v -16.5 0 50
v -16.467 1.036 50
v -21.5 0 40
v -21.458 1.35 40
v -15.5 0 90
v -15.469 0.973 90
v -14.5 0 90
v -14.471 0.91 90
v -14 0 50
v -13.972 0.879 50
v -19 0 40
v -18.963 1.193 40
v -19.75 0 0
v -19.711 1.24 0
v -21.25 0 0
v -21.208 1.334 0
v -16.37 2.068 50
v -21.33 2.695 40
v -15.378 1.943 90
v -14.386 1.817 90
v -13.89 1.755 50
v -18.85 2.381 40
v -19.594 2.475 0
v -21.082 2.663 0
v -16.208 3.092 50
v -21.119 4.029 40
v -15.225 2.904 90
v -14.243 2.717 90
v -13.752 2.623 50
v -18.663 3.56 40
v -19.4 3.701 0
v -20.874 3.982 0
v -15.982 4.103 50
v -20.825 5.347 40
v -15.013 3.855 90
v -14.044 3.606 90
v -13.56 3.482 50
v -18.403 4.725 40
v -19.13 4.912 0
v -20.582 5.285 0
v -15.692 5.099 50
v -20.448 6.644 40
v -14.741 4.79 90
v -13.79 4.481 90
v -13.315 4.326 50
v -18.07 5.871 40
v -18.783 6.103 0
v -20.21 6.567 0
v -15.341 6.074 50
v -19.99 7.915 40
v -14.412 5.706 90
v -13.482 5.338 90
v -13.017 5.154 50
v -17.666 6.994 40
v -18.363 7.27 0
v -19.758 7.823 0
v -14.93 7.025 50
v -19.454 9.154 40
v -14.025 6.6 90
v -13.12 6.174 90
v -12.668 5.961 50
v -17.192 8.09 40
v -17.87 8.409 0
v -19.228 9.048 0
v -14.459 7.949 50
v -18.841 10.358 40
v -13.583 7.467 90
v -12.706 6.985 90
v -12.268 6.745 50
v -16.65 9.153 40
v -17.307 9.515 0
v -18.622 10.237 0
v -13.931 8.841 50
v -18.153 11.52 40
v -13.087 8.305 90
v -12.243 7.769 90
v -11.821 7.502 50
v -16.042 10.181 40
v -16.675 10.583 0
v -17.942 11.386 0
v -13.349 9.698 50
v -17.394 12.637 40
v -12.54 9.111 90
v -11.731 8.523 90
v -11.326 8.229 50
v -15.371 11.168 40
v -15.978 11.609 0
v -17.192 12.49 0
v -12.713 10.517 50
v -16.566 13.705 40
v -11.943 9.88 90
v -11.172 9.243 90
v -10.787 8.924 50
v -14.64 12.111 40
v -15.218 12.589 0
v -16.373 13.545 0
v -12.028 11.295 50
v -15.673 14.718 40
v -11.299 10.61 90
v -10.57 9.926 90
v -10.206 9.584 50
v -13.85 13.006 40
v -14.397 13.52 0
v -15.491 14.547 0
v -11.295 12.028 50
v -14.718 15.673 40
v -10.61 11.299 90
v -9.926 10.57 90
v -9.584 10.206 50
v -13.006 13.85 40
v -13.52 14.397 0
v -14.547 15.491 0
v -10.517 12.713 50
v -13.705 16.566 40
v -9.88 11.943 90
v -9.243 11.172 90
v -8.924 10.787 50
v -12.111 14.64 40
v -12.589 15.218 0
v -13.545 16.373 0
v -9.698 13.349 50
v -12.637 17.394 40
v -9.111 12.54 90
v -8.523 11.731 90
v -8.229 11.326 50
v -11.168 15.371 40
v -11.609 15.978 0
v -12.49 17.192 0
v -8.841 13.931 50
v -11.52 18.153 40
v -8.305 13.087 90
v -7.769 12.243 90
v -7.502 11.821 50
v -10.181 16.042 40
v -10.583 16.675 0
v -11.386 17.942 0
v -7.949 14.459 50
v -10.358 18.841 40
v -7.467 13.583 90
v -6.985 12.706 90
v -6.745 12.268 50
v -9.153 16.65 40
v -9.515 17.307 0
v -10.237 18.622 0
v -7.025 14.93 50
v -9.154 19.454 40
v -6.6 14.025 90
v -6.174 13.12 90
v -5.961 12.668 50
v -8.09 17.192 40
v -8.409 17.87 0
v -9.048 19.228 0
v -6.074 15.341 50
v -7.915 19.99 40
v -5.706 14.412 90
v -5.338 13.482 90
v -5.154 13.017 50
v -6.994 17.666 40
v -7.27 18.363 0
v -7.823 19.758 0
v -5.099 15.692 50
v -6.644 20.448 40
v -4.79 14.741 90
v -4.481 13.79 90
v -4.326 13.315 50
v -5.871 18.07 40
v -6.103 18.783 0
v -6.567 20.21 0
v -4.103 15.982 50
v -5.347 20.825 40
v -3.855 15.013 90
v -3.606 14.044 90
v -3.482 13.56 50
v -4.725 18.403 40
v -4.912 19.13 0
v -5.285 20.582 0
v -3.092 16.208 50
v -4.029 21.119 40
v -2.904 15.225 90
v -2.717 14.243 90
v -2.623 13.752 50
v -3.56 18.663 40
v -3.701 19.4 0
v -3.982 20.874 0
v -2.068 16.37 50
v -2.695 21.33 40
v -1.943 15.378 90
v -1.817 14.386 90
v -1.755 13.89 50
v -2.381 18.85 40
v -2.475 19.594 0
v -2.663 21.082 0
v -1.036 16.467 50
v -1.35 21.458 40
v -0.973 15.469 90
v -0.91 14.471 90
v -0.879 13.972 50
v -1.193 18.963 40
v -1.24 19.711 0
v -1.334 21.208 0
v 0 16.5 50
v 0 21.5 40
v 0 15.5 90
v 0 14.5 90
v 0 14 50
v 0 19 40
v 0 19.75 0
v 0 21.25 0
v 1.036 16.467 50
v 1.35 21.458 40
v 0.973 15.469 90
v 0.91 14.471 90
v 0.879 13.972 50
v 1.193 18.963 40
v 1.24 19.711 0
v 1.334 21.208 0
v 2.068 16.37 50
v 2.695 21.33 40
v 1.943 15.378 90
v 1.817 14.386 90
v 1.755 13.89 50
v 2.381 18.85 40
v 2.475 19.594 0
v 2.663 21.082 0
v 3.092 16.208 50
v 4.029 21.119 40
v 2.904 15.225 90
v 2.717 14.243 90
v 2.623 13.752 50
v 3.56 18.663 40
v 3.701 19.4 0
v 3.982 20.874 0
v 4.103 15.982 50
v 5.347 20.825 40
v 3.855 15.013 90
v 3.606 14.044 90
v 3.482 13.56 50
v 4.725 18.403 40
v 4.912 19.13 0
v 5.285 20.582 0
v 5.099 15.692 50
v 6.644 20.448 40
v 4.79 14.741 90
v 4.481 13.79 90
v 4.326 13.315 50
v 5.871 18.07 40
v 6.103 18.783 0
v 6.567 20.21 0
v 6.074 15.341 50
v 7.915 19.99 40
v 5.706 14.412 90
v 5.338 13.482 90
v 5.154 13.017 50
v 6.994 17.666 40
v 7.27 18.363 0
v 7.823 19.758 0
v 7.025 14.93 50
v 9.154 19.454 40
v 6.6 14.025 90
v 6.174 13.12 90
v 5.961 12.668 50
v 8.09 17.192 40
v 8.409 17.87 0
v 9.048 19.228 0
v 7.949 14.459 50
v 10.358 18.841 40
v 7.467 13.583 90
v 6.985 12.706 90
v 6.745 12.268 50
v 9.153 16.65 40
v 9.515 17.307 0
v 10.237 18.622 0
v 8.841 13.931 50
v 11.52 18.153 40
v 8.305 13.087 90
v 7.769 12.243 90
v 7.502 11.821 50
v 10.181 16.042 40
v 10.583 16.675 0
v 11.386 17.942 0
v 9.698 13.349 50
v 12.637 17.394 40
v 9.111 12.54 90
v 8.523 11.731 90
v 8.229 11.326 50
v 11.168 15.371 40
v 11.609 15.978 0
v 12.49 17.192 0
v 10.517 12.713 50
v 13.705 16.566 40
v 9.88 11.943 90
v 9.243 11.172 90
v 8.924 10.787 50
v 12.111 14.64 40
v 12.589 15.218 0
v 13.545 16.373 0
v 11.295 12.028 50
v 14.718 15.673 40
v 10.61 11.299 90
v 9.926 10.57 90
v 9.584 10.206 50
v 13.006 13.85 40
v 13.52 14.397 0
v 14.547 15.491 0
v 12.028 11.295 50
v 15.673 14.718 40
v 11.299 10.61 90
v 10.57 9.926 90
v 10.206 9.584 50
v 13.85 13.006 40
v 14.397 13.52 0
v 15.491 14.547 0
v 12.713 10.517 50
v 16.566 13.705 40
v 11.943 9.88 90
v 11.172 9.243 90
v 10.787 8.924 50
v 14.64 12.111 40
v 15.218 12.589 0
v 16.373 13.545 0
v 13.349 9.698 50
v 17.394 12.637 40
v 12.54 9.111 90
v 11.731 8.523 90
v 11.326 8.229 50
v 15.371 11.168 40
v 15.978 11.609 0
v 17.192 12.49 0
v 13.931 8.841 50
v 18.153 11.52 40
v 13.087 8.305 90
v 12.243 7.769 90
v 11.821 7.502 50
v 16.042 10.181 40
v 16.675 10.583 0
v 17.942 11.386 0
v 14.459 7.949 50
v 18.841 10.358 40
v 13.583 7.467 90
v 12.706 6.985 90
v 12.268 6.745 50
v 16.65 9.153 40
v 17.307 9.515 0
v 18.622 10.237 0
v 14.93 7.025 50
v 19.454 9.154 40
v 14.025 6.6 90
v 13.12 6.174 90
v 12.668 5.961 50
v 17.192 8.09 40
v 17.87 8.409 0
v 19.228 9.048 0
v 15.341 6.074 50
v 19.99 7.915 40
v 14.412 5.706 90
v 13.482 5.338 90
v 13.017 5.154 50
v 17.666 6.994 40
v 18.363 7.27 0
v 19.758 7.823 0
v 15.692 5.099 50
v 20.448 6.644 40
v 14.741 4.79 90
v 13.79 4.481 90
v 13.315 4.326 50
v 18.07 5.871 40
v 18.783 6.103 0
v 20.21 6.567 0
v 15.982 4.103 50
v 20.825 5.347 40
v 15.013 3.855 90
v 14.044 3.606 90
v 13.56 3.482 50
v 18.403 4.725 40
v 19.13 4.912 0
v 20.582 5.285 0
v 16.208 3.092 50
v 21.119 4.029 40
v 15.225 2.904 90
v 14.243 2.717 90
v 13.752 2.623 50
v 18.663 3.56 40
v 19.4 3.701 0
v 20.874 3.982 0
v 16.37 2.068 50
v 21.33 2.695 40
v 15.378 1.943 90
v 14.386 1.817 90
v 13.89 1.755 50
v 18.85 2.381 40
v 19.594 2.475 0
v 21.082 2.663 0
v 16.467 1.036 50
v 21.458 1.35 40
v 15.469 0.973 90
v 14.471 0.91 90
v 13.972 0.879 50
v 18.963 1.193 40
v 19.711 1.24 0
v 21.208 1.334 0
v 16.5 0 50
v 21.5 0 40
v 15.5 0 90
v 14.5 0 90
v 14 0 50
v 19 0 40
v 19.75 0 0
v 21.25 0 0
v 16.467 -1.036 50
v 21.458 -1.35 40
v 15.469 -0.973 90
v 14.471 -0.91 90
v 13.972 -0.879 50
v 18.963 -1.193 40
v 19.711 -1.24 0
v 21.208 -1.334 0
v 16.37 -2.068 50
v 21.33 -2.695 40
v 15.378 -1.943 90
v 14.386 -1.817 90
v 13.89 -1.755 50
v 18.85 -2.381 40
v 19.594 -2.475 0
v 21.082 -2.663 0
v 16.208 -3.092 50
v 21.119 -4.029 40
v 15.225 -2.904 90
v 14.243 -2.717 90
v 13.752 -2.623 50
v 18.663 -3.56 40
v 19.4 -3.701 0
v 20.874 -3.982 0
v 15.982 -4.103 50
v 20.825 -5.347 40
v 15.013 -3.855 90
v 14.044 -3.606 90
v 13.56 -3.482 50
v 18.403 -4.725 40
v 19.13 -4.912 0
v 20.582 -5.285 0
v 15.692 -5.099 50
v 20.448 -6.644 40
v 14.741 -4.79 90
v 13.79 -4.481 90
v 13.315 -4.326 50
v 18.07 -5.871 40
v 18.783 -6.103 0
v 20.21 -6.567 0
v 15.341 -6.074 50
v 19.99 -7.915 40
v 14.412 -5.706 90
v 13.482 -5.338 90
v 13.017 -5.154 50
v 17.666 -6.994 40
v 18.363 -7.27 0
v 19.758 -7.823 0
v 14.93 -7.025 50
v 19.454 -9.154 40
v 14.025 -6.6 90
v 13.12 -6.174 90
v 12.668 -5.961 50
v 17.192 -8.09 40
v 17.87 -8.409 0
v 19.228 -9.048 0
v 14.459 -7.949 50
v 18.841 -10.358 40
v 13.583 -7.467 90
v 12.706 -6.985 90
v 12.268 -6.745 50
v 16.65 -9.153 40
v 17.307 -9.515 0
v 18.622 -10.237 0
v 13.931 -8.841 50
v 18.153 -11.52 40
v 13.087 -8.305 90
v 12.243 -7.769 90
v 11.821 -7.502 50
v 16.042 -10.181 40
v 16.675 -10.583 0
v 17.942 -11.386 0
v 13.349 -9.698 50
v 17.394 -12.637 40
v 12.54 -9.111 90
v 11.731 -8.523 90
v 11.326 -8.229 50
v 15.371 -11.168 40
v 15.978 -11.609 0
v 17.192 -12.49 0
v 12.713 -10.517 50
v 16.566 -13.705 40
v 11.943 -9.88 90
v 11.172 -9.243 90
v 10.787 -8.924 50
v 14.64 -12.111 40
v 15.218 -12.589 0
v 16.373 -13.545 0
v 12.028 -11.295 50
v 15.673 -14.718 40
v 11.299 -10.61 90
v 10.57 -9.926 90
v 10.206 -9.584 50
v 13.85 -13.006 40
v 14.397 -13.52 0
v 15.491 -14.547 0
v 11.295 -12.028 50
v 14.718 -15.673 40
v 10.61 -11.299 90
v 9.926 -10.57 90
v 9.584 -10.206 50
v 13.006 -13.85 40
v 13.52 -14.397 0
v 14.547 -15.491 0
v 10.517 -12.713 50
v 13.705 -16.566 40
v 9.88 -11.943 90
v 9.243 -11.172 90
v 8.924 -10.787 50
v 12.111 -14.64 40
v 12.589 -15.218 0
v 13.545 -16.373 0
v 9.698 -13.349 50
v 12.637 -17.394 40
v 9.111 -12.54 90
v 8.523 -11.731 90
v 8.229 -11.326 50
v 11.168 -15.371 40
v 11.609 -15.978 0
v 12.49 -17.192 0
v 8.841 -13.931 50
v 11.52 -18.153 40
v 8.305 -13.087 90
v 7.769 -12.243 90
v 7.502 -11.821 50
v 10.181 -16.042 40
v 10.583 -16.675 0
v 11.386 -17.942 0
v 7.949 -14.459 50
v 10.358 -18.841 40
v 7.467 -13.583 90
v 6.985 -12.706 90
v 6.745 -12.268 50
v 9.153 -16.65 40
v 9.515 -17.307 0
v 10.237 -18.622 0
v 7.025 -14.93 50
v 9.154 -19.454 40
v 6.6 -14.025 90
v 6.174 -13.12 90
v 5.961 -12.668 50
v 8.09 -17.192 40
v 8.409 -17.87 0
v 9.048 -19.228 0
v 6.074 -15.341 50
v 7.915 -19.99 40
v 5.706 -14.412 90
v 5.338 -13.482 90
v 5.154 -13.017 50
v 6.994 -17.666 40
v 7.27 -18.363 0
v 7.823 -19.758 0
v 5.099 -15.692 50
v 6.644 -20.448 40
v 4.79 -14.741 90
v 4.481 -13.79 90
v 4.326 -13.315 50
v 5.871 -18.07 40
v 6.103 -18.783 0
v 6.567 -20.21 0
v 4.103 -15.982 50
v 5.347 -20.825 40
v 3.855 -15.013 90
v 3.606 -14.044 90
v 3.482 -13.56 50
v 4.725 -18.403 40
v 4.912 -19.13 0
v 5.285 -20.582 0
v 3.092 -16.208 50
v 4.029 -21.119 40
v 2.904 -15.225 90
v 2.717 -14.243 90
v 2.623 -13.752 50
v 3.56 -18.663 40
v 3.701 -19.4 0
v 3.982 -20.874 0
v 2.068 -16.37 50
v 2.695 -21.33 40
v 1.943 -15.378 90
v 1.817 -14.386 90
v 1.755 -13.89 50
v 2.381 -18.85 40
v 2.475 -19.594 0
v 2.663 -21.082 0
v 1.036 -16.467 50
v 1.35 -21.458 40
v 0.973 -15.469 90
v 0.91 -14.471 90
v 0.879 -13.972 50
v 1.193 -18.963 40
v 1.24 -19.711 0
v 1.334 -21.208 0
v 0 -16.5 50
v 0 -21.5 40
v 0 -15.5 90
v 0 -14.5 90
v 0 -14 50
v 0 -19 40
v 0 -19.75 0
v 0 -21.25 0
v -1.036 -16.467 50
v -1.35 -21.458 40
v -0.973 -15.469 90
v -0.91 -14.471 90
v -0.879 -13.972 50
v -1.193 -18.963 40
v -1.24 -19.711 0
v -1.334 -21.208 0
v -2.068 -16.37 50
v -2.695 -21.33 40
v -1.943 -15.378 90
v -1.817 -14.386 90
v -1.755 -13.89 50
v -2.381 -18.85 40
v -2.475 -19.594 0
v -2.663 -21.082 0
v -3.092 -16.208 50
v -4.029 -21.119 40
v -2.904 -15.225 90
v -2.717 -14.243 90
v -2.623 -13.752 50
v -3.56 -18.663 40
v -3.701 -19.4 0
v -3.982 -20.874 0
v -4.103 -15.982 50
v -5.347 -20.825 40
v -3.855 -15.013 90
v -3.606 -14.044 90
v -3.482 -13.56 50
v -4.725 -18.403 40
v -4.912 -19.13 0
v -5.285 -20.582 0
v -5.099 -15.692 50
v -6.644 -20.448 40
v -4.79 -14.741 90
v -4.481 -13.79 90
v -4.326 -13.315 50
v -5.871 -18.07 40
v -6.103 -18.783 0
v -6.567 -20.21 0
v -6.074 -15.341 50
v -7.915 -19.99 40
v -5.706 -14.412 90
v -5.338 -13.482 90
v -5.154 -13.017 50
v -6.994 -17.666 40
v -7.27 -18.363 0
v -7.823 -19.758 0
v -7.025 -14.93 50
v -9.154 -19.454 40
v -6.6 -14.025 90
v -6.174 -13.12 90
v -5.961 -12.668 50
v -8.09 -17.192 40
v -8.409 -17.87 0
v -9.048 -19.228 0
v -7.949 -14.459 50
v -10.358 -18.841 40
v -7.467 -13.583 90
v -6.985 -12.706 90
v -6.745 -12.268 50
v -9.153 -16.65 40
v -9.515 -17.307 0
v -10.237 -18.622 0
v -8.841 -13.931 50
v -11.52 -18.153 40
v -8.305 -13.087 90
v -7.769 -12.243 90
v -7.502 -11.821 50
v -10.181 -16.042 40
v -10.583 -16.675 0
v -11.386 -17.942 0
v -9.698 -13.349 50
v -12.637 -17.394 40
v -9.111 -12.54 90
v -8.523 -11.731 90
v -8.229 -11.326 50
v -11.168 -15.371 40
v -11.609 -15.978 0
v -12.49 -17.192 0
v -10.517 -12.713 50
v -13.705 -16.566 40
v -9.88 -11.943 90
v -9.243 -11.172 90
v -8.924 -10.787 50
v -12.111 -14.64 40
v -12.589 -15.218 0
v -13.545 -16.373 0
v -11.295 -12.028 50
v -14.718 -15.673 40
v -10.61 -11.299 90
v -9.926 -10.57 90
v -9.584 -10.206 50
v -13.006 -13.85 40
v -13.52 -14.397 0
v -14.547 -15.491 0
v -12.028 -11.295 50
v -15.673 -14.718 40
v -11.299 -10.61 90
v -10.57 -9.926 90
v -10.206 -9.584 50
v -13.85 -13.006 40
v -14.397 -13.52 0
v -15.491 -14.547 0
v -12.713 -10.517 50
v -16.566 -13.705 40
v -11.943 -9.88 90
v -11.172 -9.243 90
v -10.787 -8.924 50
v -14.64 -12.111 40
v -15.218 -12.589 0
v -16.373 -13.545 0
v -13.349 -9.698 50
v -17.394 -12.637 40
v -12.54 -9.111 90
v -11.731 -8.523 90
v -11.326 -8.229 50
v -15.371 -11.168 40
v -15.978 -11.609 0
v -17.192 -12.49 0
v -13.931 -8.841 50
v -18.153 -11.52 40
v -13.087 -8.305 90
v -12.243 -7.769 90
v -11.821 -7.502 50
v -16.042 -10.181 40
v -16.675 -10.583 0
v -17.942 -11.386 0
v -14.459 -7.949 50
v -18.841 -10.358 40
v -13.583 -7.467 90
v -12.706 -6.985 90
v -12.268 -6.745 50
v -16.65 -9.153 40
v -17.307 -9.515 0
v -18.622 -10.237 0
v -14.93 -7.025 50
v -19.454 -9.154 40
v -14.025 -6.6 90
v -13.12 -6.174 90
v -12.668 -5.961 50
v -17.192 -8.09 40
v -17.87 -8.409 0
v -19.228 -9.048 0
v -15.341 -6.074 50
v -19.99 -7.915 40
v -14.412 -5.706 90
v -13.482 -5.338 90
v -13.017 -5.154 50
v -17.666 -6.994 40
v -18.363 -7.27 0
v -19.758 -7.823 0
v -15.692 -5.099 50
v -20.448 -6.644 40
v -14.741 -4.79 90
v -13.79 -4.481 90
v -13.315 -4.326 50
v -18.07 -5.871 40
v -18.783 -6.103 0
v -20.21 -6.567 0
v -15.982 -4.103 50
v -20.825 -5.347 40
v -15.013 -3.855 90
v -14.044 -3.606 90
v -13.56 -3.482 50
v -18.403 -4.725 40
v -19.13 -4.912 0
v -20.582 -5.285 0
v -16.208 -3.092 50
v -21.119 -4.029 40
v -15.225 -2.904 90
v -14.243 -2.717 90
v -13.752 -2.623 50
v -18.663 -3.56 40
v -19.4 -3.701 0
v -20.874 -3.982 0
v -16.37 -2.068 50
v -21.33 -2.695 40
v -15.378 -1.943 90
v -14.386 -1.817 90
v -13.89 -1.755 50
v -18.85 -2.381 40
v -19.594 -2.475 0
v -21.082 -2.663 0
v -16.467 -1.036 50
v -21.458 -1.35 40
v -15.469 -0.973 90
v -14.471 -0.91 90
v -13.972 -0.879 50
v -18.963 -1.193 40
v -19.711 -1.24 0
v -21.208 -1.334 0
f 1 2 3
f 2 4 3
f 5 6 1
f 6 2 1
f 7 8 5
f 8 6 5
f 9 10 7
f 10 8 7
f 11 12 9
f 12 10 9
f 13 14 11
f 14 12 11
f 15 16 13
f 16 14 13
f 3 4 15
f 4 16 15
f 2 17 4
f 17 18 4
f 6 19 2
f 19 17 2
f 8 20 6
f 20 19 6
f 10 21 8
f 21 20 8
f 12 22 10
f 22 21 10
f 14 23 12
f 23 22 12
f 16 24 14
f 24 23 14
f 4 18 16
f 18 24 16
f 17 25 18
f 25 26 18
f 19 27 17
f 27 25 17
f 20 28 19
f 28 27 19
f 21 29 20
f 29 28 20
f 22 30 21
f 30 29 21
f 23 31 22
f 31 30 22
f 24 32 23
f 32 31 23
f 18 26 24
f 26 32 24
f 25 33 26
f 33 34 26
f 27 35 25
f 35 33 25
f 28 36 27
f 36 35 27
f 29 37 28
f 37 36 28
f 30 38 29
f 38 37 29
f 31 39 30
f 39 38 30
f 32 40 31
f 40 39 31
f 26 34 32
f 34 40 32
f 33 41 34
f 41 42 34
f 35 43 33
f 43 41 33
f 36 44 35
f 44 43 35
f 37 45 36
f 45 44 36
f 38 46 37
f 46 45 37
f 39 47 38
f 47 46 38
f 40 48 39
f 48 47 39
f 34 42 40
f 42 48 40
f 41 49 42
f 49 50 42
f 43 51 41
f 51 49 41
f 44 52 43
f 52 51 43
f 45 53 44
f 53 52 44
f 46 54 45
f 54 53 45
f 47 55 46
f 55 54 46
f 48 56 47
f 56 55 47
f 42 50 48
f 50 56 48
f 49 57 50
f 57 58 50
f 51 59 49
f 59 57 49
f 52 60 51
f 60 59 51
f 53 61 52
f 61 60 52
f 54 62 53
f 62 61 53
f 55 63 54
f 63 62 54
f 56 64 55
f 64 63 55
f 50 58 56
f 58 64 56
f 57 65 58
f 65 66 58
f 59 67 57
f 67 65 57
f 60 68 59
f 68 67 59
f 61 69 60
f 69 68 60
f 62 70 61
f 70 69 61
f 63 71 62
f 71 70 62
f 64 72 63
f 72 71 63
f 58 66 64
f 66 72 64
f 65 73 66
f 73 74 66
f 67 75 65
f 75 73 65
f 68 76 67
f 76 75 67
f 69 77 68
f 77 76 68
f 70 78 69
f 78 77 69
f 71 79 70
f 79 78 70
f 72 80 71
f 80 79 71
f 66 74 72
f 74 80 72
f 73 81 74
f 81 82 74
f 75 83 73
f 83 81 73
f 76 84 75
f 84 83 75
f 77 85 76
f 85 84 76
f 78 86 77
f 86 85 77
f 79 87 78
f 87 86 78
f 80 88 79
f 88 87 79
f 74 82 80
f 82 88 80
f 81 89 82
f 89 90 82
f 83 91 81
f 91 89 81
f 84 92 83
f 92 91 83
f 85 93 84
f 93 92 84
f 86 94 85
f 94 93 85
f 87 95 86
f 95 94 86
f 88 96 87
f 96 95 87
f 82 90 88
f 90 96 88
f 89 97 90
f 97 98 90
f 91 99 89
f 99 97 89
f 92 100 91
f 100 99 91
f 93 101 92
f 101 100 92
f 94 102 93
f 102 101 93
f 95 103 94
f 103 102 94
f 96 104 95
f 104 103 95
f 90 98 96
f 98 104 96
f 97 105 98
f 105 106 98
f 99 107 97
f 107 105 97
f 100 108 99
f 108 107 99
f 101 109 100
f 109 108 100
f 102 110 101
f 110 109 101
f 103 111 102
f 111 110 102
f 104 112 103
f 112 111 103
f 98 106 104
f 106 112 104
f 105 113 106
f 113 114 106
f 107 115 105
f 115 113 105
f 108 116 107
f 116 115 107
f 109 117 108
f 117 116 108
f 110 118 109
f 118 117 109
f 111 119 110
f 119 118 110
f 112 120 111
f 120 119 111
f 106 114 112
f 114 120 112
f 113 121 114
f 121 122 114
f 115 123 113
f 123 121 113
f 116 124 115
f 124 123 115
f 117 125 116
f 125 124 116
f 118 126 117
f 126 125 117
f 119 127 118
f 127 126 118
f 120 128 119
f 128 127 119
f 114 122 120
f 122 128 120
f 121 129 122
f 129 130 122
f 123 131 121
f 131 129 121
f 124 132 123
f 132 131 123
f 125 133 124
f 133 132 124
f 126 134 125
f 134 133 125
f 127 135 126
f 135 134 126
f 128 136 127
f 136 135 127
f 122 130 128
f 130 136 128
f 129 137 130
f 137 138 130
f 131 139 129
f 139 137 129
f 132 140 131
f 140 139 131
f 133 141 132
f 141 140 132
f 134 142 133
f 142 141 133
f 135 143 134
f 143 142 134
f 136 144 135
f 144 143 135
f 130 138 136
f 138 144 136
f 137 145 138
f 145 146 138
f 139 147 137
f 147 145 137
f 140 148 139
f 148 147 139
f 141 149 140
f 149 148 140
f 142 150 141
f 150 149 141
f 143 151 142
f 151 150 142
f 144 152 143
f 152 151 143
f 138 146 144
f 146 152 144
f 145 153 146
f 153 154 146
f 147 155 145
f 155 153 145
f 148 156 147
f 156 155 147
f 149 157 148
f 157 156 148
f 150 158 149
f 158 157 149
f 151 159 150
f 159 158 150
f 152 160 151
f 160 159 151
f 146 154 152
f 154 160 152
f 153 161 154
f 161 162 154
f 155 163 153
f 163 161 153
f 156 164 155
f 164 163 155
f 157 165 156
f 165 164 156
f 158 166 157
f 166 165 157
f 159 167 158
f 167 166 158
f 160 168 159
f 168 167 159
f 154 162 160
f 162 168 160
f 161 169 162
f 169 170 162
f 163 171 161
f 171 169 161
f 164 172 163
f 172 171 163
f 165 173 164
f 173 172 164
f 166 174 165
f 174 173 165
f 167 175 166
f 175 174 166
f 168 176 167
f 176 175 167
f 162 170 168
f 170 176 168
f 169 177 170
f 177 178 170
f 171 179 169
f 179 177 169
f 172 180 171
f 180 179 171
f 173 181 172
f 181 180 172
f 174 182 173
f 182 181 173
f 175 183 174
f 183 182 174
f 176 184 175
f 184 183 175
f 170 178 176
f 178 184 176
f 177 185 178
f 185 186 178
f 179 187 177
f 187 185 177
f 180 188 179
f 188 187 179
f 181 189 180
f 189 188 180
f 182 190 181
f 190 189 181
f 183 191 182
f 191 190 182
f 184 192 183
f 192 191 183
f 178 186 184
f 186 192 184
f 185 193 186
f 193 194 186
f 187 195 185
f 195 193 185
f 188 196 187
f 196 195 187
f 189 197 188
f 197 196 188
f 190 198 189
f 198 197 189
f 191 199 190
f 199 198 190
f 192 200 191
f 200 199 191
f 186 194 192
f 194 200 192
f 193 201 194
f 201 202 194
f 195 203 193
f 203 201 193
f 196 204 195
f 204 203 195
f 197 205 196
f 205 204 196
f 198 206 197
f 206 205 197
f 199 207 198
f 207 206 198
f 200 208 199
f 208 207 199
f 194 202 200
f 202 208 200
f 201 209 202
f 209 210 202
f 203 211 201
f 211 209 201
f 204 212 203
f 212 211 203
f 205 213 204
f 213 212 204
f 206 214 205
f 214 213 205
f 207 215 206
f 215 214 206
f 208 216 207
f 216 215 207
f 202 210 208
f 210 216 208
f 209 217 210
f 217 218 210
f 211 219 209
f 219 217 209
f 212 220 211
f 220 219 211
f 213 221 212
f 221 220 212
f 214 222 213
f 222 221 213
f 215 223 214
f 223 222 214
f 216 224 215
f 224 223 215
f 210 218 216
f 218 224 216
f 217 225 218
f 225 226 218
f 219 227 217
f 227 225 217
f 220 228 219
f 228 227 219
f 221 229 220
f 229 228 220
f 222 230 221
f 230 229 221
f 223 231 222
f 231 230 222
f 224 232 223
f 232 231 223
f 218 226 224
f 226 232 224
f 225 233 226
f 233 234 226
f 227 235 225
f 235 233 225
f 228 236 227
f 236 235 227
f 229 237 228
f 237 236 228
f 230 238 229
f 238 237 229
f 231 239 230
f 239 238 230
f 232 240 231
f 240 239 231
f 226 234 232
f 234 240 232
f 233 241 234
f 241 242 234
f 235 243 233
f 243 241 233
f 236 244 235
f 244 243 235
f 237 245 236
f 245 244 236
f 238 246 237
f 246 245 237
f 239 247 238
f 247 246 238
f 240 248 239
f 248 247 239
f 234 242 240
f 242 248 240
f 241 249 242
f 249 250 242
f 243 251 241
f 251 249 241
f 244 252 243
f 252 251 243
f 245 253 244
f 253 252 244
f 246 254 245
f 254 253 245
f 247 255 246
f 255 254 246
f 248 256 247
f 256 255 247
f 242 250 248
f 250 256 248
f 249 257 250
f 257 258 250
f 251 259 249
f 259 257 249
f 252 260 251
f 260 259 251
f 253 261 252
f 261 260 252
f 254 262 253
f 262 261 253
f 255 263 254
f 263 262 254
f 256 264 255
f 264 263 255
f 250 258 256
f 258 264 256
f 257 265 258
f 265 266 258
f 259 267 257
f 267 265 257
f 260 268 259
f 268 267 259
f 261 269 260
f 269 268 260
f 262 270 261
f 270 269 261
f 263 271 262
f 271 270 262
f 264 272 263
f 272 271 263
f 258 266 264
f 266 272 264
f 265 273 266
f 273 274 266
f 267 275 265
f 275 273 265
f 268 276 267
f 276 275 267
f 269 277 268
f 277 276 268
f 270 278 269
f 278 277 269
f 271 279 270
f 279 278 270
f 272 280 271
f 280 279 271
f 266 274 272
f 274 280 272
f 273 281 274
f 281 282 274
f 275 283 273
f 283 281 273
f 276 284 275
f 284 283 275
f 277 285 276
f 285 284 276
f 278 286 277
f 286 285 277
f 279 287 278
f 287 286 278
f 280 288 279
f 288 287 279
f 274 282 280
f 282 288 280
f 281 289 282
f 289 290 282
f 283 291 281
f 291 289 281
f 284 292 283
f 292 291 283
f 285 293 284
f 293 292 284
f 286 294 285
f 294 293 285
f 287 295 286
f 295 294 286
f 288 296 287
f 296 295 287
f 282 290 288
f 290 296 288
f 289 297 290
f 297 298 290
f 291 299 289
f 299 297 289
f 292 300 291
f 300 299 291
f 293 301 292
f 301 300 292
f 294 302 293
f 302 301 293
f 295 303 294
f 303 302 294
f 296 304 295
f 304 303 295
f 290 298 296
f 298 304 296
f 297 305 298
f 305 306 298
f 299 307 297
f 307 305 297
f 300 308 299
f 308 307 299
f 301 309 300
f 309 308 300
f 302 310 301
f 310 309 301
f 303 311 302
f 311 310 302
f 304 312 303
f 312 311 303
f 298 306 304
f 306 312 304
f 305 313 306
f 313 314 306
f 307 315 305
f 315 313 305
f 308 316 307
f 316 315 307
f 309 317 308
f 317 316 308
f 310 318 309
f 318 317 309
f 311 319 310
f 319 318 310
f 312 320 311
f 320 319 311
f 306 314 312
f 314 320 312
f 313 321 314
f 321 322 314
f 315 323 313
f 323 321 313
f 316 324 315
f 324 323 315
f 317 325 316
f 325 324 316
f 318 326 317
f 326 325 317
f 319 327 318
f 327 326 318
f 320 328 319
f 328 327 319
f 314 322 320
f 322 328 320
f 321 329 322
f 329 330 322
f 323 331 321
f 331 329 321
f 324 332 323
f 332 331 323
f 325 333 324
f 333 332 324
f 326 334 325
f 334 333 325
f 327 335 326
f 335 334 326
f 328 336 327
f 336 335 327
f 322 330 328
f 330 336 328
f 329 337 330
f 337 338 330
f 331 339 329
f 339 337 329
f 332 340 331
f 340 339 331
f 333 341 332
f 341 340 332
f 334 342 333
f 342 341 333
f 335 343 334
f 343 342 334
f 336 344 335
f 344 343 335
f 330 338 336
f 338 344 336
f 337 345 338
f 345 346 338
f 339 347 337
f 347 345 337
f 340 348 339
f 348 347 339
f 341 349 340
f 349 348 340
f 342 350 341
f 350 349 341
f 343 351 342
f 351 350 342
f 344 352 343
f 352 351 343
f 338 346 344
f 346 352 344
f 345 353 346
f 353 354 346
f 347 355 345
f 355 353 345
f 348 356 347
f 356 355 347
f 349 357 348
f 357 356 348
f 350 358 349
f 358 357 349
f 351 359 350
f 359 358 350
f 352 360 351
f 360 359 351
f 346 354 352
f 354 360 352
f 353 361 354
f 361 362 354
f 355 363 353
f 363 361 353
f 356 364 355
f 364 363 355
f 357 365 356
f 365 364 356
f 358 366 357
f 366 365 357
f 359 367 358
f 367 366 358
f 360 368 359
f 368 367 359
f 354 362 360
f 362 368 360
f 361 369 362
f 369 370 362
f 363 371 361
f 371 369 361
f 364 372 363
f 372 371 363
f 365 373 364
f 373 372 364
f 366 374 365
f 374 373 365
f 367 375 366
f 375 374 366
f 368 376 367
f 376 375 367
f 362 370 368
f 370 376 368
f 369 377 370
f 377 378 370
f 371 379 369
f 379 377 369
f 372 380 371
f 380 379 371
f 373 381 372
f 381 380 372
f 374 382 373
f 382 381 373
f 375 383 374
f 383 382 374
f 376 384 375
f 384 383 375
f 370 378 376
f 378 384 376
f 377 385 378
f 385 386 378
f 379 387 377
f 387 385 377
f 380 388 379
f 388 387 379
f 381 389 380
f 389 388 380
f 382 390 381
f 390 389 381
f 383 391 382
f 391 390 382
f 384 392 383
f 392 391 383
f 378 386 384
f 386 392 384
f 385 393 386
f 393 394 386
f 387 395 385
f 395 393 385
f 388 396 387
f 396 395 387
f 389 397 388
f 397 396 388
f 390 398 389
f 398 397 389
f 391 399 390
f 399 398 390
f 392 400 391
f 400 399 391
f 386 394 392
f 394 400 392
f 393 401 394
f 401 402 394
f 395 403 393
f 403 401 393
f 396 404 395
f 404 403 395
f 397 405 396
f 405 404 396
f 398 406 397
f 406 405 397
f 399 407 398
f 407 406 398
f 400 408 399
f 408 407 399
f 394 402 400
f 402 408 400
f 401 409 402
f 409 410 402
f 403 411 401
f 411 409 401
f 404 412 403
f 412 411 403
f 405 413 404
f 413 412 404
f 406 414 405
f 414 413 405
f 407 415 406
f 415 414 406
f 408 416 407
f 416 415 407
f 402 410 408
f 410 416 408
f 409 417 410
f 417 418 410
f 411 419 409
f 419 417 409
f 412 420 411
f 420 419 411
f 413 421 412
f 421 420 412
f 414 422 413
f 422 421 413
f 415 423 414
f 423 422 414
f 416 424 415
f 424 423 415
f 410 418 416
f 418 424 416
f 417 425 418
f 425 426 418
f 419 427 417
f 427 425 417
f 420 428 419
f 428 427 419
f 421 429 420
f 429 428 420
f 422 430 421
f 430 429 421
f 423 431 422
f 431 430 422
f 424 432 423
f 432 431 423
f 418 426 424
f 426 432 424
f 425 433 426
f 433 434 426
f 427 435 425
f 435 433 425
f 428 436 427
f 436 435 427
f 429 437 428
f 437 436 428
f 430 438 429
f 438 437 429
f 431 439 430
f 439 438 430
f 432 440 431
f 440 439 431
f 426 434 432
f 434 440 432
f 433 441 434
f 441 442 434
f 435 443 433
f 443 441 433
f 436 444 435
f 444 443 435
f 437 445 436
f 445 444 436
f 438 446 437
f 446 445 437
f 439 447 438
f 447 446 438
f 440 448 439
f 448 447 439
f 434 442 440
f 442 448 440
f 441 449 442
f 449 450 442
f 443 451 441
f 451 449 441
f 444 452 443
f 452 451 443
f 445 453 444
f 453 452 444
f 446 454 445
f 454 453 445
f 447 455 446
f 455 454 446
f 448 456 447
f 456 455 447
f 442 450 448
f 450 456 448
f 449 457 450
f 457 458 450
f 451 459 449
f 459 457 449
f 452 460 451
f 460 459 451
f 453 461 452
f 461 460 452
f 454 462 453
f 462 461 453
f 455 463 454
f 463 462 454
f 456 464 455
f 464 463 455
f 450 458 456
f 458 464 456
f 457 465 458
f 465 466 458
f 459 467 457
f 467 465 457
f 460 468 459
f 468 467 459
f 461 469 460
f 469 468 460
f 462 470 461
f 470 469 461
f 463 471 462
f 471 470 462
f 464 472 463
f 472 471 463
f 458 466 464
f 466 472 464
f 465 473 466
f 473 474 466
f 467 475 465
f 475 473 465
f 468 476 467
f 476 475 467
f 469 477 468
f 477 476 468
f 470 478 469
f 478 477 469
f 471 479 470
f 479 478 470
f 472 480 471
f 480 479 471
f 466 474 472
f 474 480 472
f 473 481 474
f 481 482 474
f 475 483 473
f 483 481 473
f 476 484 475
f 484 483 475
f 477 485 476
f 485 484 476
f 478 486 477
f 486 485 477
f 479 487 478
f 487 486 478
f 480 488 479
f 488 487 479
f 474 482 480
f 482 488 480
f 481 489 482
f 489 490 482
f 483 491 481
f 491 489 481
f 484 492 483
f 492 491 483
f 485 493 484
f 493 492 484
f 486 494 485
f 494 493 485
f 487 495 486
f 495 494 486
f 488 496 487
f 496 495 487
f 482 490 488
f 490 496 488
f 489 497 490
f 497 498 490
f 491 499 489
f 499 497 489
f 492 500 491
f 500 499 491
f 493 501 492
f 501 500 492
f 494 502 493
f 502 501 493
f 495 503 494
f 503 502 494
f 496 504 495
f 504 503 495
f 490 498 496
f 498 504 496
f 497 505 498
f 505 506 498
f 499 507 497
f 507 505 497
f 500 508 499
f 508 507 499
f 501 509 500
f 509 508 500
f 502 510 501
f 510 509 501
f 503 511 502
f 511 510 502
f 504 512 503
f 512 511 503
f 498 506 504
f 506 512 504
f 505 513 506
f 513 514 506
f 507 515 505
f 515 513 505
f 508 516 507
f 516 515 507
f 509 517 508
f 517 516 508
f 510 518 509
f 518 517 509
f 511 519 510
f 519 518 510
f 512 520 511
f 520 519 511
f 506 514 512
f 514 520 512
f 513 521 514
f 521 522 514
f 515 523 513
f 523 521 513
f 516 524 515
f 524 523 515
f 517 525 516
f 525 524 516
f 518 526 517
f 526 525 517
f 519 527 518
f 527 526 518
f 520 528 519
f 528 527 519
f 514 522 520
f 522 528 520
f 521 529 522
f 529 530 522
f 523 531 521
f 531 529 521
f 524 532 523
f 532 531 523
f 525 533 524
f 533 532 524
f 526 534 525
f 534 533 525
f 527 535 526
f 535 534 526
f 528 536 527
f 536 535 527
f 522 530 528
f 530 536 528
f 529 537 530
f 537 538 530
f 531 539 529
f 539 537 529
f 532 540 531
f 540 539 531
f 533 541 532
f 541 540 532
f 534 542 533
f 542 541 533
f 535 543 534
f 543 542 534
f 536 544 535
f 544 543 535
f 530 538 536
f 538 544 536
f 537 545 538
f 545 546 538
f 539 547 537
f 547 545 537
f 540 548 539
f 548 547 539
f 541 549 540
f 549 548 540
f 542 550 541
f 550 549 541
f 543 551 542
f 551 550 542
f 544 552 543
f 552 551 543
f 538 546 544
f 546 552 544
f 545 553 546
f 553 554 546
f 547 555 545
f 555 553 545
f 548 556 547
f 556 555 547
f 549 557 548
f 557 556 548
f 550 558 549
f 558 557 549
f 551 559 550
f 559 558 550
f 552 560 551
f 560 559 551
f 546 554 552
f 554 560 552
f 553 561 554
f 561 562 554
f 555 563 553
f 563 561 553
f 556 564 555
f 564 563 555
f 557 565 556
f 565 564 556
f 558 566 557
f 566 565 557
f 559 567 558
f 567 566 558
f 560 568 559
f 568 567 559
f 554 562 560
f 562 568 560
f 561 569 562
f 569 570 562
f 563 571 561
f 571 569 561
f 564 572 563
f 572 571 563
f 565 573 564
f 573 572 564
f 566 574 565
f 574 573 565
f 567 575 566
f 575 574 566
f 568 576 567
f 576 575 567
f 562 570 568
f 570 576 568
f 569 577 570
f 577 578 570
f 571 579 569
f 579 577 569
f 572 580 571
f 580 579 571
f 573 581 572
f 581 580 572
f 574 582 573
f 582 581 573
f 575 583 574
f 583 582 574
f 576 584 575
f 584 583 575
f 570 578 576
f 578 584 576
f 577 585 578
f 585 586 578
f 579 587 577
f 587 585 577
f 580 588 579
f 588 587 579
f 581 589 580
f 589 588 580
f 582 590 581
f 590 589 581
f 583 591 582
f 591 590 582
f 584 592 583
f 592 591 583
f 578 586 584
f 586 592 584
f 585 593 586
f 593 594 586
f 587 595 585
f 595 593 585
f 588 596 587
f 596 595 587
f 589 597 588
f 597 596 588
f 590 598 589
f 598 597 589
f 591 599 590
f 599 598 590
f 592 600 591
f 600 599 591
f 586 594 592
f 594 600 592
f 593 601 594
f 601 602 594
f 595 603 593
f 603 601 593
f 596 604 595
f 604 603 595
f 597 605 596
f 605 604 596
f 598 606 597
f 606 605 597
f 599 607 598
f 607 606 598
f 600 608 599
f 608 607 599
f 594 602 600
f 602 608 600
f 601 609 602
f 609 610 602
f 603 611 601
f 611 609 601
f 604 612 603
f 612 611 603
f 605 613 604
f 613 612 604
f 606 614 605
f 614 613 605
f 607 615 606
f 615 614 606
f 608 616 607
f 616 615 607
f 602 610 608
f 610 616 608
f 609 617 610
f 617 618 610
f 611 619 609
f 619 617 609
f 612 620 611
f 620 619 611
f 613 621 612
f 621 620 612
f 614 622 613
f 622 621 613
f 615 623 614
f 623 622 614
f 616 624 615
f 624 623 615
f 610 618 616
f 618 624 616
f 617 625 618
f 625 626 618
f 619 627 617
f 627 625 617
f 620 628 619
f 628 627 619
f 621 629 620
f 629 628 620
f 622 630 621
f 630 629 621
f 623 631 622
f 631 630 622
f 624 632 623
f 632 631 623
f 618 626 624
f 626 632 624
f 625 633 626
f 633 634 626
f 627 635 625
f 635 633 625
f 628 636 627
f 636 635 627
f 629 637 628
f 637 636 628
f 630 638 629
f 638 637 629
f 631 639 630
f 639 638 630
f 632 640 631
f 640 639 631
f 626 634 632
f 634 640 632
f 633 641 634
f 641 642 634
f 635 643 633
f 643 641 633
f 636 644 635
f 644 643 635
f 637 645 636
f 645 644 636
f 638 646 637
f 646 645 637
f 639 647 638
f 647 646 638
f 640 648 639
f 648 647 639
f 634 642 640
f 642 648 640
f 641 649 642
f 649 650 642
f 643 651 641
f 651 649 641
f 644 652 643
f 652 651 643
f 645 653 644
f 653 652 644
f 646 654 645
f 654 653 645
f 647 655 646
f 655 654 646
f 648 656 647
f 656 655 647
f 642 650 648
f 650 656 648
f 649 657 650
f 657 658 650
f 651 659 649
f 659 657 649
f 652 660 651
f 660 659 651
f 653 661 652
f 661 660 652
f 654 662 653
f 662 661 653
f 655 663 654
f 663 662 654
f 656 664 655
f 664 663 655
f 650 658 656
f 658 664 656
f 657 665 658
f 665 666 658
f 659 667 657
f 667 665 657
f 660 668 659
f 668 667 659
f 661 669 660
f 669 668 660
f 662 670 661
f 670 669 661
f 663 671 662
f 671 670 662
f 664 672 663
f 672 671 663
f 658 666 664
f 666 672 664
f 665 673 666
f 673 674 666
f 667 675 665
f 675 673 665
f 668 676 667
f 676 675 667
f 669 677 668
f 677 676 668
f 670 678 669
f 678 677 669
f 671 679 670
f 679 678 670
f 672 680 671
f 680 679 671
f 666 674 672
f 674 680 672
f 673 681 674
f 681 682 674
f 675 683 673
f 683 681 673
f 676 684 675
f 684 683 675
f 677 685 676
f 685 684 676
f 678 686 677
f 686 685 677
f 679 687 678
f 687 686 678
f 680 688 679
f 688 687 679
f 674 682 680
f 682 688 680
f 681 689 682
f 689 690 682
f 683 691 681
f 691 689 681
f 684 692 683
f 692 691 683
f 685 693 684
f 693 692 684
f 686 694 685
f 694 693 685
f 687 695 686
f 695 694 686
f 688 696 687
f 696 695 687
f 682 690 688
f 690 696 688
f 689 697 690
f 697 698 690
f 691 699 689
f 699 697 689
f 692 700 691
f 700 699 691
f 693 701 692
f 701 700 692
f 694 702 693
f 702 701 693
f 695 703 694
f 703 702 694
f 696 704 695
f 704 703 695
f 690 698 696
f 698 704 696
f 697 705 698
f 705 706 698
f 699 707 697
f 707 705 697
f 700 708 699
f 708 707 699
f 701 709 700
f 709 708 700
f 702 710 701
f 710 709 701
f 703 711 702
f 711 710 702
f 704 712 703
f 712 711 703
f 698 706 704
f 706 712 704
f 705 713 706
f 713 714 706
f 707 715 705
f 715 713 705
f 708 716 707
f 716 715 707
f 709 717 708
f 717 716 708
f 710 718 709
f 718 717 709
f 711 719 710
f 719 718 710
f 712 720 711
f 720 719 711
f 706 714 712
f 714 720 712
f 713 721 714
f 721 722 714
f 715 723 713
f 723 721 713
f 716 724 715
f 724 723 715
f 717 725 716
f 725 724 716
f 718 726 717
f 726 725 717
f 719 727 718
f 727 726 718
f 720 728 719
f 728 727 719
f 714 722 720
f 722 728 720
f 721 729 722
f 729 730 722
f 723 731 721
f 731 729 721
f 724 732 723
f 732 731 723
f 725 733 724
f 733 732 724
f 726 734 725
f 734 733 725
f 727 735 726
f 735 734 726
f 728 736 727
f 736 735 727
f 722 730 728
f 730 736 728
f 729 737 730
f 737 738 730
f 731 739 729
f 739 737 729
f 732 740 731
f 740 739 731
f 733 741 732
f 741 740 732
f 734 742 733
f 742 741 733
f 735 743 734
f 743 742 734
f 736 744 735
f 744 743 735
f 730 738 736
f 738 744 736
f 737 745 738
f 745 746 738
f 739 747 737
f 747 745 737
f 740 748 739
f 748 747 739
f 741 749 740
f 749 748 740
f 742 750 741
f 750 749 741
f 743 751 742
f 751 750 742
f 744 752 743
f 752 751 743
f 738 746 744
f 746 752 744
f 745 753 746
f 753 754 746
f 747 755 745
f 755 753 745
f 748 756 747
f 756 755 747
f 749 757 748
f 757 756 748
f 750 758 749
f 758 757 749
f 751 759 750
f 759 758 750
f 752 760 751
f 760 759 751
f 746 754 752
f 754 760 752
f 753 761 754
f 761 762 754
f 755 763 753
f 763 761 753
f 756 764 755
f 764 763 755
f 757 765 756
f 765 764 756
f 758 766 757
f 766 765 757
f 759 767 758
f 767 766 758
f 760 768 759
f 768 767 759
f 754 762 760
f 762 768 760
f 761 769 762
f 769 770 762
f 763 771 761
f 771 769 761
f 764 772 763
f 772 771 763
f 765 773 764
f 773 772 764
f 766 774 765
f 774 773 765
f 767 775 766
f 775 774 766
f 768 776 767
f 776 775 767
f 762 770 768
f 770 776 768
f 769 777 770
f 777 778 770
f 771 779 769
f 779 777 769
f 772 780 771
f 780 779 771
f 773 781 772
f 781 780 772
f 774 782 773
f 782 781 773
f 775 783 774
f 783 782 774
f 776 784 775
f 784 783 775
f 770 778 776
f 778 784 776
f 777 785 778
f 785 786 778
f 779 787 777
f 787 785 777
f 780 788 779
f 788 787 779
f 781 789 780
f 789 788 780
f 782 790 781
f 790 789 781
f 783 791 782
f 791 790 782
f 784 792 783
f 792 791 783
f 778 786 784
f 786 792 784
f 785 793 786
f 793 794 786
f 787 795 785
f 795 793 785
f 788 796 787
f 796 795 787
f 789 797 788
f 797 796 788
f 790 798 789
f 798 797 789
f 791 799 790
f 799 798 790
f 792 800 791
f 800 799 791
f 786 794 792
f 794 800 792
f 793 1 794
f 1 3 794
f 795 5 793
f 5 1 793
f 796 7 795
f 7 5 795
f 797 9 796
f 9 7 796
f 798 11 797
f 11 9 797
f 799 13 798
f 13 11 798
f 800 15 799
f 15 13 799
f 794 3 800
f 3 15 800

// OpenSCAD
// Bottom segment bottom inner diameter
bbi = 39.5; // [1:0.5:100]

// Bottom segment bottom outer diameter
bbo = 42.5; // [1:0.5:100]

// Bottom segment top inner diameter
bti = 38; // [1:0.5:100]

// Bottom segment top outer diameter
bto = 43; // [1:0.5:100]

// Bottom segment height
bh = 40; // [1:0.5:100]

// Junction height
jh = 10; // [1:0.5:100]

// Top segment bottom inner diameter
tbi = 28; // [1:0.5:100]

// Top segment bottom outer diameter
tbo = 33; // [1:0.5:100]

// Top segment top inner diameter
tti = 29; // [1:0.5:100]

// Top segment top outer diameter
tto = 31; // [1:0.5:100]

// Top segment height
th = 40; // [1:0.5:100]

//descr = [
//    [39.5, 42.5, 0], // internal
//    [38, 43, 40], // internal
//    [28, 33, 10], // external
//    [29, 31, 40], // external
//];

descr = [
    [bbi, bbo, 0],
    [bti, bto, bh],
    [tbi, tbo, jh],
    [tti, tto, th]
];

$fn = 100;

//use <pipe.scad>
//-------------------------------------------------------------------------------
// descr is a vector of vectors [inner_d, outer_d, height]
module pipe(descr, $fn=$fn) {
    function combine_descr(descr, i) =
        i == 0
            ? [[[descr[0][0], descr[0][2]]], [[descr[0][1], descr[0][2]]]]
            : let(p=combine_descr(descr, i-1), h=p[0][i-1][1]+descr[i][2])
                [concat(p[0], [[descr[i][0], h]]), concat(p[1], [[descr[i][1], h]])];
                
    function create_shape(descr) =
        let(c=combine_descr(descr, len(descr) - 1))
            concat(c[0], [for (i = [len(c[1])-1:-1:0]) c[1][i]]);
                
    rotate_extrude($fn=$fn)
        scale([0.5, 1]) // diameter -> radius
            polygon(create_shape(descr));
}
//-------------------------------------------------------------------------------

// print_part
pipe(descr);
